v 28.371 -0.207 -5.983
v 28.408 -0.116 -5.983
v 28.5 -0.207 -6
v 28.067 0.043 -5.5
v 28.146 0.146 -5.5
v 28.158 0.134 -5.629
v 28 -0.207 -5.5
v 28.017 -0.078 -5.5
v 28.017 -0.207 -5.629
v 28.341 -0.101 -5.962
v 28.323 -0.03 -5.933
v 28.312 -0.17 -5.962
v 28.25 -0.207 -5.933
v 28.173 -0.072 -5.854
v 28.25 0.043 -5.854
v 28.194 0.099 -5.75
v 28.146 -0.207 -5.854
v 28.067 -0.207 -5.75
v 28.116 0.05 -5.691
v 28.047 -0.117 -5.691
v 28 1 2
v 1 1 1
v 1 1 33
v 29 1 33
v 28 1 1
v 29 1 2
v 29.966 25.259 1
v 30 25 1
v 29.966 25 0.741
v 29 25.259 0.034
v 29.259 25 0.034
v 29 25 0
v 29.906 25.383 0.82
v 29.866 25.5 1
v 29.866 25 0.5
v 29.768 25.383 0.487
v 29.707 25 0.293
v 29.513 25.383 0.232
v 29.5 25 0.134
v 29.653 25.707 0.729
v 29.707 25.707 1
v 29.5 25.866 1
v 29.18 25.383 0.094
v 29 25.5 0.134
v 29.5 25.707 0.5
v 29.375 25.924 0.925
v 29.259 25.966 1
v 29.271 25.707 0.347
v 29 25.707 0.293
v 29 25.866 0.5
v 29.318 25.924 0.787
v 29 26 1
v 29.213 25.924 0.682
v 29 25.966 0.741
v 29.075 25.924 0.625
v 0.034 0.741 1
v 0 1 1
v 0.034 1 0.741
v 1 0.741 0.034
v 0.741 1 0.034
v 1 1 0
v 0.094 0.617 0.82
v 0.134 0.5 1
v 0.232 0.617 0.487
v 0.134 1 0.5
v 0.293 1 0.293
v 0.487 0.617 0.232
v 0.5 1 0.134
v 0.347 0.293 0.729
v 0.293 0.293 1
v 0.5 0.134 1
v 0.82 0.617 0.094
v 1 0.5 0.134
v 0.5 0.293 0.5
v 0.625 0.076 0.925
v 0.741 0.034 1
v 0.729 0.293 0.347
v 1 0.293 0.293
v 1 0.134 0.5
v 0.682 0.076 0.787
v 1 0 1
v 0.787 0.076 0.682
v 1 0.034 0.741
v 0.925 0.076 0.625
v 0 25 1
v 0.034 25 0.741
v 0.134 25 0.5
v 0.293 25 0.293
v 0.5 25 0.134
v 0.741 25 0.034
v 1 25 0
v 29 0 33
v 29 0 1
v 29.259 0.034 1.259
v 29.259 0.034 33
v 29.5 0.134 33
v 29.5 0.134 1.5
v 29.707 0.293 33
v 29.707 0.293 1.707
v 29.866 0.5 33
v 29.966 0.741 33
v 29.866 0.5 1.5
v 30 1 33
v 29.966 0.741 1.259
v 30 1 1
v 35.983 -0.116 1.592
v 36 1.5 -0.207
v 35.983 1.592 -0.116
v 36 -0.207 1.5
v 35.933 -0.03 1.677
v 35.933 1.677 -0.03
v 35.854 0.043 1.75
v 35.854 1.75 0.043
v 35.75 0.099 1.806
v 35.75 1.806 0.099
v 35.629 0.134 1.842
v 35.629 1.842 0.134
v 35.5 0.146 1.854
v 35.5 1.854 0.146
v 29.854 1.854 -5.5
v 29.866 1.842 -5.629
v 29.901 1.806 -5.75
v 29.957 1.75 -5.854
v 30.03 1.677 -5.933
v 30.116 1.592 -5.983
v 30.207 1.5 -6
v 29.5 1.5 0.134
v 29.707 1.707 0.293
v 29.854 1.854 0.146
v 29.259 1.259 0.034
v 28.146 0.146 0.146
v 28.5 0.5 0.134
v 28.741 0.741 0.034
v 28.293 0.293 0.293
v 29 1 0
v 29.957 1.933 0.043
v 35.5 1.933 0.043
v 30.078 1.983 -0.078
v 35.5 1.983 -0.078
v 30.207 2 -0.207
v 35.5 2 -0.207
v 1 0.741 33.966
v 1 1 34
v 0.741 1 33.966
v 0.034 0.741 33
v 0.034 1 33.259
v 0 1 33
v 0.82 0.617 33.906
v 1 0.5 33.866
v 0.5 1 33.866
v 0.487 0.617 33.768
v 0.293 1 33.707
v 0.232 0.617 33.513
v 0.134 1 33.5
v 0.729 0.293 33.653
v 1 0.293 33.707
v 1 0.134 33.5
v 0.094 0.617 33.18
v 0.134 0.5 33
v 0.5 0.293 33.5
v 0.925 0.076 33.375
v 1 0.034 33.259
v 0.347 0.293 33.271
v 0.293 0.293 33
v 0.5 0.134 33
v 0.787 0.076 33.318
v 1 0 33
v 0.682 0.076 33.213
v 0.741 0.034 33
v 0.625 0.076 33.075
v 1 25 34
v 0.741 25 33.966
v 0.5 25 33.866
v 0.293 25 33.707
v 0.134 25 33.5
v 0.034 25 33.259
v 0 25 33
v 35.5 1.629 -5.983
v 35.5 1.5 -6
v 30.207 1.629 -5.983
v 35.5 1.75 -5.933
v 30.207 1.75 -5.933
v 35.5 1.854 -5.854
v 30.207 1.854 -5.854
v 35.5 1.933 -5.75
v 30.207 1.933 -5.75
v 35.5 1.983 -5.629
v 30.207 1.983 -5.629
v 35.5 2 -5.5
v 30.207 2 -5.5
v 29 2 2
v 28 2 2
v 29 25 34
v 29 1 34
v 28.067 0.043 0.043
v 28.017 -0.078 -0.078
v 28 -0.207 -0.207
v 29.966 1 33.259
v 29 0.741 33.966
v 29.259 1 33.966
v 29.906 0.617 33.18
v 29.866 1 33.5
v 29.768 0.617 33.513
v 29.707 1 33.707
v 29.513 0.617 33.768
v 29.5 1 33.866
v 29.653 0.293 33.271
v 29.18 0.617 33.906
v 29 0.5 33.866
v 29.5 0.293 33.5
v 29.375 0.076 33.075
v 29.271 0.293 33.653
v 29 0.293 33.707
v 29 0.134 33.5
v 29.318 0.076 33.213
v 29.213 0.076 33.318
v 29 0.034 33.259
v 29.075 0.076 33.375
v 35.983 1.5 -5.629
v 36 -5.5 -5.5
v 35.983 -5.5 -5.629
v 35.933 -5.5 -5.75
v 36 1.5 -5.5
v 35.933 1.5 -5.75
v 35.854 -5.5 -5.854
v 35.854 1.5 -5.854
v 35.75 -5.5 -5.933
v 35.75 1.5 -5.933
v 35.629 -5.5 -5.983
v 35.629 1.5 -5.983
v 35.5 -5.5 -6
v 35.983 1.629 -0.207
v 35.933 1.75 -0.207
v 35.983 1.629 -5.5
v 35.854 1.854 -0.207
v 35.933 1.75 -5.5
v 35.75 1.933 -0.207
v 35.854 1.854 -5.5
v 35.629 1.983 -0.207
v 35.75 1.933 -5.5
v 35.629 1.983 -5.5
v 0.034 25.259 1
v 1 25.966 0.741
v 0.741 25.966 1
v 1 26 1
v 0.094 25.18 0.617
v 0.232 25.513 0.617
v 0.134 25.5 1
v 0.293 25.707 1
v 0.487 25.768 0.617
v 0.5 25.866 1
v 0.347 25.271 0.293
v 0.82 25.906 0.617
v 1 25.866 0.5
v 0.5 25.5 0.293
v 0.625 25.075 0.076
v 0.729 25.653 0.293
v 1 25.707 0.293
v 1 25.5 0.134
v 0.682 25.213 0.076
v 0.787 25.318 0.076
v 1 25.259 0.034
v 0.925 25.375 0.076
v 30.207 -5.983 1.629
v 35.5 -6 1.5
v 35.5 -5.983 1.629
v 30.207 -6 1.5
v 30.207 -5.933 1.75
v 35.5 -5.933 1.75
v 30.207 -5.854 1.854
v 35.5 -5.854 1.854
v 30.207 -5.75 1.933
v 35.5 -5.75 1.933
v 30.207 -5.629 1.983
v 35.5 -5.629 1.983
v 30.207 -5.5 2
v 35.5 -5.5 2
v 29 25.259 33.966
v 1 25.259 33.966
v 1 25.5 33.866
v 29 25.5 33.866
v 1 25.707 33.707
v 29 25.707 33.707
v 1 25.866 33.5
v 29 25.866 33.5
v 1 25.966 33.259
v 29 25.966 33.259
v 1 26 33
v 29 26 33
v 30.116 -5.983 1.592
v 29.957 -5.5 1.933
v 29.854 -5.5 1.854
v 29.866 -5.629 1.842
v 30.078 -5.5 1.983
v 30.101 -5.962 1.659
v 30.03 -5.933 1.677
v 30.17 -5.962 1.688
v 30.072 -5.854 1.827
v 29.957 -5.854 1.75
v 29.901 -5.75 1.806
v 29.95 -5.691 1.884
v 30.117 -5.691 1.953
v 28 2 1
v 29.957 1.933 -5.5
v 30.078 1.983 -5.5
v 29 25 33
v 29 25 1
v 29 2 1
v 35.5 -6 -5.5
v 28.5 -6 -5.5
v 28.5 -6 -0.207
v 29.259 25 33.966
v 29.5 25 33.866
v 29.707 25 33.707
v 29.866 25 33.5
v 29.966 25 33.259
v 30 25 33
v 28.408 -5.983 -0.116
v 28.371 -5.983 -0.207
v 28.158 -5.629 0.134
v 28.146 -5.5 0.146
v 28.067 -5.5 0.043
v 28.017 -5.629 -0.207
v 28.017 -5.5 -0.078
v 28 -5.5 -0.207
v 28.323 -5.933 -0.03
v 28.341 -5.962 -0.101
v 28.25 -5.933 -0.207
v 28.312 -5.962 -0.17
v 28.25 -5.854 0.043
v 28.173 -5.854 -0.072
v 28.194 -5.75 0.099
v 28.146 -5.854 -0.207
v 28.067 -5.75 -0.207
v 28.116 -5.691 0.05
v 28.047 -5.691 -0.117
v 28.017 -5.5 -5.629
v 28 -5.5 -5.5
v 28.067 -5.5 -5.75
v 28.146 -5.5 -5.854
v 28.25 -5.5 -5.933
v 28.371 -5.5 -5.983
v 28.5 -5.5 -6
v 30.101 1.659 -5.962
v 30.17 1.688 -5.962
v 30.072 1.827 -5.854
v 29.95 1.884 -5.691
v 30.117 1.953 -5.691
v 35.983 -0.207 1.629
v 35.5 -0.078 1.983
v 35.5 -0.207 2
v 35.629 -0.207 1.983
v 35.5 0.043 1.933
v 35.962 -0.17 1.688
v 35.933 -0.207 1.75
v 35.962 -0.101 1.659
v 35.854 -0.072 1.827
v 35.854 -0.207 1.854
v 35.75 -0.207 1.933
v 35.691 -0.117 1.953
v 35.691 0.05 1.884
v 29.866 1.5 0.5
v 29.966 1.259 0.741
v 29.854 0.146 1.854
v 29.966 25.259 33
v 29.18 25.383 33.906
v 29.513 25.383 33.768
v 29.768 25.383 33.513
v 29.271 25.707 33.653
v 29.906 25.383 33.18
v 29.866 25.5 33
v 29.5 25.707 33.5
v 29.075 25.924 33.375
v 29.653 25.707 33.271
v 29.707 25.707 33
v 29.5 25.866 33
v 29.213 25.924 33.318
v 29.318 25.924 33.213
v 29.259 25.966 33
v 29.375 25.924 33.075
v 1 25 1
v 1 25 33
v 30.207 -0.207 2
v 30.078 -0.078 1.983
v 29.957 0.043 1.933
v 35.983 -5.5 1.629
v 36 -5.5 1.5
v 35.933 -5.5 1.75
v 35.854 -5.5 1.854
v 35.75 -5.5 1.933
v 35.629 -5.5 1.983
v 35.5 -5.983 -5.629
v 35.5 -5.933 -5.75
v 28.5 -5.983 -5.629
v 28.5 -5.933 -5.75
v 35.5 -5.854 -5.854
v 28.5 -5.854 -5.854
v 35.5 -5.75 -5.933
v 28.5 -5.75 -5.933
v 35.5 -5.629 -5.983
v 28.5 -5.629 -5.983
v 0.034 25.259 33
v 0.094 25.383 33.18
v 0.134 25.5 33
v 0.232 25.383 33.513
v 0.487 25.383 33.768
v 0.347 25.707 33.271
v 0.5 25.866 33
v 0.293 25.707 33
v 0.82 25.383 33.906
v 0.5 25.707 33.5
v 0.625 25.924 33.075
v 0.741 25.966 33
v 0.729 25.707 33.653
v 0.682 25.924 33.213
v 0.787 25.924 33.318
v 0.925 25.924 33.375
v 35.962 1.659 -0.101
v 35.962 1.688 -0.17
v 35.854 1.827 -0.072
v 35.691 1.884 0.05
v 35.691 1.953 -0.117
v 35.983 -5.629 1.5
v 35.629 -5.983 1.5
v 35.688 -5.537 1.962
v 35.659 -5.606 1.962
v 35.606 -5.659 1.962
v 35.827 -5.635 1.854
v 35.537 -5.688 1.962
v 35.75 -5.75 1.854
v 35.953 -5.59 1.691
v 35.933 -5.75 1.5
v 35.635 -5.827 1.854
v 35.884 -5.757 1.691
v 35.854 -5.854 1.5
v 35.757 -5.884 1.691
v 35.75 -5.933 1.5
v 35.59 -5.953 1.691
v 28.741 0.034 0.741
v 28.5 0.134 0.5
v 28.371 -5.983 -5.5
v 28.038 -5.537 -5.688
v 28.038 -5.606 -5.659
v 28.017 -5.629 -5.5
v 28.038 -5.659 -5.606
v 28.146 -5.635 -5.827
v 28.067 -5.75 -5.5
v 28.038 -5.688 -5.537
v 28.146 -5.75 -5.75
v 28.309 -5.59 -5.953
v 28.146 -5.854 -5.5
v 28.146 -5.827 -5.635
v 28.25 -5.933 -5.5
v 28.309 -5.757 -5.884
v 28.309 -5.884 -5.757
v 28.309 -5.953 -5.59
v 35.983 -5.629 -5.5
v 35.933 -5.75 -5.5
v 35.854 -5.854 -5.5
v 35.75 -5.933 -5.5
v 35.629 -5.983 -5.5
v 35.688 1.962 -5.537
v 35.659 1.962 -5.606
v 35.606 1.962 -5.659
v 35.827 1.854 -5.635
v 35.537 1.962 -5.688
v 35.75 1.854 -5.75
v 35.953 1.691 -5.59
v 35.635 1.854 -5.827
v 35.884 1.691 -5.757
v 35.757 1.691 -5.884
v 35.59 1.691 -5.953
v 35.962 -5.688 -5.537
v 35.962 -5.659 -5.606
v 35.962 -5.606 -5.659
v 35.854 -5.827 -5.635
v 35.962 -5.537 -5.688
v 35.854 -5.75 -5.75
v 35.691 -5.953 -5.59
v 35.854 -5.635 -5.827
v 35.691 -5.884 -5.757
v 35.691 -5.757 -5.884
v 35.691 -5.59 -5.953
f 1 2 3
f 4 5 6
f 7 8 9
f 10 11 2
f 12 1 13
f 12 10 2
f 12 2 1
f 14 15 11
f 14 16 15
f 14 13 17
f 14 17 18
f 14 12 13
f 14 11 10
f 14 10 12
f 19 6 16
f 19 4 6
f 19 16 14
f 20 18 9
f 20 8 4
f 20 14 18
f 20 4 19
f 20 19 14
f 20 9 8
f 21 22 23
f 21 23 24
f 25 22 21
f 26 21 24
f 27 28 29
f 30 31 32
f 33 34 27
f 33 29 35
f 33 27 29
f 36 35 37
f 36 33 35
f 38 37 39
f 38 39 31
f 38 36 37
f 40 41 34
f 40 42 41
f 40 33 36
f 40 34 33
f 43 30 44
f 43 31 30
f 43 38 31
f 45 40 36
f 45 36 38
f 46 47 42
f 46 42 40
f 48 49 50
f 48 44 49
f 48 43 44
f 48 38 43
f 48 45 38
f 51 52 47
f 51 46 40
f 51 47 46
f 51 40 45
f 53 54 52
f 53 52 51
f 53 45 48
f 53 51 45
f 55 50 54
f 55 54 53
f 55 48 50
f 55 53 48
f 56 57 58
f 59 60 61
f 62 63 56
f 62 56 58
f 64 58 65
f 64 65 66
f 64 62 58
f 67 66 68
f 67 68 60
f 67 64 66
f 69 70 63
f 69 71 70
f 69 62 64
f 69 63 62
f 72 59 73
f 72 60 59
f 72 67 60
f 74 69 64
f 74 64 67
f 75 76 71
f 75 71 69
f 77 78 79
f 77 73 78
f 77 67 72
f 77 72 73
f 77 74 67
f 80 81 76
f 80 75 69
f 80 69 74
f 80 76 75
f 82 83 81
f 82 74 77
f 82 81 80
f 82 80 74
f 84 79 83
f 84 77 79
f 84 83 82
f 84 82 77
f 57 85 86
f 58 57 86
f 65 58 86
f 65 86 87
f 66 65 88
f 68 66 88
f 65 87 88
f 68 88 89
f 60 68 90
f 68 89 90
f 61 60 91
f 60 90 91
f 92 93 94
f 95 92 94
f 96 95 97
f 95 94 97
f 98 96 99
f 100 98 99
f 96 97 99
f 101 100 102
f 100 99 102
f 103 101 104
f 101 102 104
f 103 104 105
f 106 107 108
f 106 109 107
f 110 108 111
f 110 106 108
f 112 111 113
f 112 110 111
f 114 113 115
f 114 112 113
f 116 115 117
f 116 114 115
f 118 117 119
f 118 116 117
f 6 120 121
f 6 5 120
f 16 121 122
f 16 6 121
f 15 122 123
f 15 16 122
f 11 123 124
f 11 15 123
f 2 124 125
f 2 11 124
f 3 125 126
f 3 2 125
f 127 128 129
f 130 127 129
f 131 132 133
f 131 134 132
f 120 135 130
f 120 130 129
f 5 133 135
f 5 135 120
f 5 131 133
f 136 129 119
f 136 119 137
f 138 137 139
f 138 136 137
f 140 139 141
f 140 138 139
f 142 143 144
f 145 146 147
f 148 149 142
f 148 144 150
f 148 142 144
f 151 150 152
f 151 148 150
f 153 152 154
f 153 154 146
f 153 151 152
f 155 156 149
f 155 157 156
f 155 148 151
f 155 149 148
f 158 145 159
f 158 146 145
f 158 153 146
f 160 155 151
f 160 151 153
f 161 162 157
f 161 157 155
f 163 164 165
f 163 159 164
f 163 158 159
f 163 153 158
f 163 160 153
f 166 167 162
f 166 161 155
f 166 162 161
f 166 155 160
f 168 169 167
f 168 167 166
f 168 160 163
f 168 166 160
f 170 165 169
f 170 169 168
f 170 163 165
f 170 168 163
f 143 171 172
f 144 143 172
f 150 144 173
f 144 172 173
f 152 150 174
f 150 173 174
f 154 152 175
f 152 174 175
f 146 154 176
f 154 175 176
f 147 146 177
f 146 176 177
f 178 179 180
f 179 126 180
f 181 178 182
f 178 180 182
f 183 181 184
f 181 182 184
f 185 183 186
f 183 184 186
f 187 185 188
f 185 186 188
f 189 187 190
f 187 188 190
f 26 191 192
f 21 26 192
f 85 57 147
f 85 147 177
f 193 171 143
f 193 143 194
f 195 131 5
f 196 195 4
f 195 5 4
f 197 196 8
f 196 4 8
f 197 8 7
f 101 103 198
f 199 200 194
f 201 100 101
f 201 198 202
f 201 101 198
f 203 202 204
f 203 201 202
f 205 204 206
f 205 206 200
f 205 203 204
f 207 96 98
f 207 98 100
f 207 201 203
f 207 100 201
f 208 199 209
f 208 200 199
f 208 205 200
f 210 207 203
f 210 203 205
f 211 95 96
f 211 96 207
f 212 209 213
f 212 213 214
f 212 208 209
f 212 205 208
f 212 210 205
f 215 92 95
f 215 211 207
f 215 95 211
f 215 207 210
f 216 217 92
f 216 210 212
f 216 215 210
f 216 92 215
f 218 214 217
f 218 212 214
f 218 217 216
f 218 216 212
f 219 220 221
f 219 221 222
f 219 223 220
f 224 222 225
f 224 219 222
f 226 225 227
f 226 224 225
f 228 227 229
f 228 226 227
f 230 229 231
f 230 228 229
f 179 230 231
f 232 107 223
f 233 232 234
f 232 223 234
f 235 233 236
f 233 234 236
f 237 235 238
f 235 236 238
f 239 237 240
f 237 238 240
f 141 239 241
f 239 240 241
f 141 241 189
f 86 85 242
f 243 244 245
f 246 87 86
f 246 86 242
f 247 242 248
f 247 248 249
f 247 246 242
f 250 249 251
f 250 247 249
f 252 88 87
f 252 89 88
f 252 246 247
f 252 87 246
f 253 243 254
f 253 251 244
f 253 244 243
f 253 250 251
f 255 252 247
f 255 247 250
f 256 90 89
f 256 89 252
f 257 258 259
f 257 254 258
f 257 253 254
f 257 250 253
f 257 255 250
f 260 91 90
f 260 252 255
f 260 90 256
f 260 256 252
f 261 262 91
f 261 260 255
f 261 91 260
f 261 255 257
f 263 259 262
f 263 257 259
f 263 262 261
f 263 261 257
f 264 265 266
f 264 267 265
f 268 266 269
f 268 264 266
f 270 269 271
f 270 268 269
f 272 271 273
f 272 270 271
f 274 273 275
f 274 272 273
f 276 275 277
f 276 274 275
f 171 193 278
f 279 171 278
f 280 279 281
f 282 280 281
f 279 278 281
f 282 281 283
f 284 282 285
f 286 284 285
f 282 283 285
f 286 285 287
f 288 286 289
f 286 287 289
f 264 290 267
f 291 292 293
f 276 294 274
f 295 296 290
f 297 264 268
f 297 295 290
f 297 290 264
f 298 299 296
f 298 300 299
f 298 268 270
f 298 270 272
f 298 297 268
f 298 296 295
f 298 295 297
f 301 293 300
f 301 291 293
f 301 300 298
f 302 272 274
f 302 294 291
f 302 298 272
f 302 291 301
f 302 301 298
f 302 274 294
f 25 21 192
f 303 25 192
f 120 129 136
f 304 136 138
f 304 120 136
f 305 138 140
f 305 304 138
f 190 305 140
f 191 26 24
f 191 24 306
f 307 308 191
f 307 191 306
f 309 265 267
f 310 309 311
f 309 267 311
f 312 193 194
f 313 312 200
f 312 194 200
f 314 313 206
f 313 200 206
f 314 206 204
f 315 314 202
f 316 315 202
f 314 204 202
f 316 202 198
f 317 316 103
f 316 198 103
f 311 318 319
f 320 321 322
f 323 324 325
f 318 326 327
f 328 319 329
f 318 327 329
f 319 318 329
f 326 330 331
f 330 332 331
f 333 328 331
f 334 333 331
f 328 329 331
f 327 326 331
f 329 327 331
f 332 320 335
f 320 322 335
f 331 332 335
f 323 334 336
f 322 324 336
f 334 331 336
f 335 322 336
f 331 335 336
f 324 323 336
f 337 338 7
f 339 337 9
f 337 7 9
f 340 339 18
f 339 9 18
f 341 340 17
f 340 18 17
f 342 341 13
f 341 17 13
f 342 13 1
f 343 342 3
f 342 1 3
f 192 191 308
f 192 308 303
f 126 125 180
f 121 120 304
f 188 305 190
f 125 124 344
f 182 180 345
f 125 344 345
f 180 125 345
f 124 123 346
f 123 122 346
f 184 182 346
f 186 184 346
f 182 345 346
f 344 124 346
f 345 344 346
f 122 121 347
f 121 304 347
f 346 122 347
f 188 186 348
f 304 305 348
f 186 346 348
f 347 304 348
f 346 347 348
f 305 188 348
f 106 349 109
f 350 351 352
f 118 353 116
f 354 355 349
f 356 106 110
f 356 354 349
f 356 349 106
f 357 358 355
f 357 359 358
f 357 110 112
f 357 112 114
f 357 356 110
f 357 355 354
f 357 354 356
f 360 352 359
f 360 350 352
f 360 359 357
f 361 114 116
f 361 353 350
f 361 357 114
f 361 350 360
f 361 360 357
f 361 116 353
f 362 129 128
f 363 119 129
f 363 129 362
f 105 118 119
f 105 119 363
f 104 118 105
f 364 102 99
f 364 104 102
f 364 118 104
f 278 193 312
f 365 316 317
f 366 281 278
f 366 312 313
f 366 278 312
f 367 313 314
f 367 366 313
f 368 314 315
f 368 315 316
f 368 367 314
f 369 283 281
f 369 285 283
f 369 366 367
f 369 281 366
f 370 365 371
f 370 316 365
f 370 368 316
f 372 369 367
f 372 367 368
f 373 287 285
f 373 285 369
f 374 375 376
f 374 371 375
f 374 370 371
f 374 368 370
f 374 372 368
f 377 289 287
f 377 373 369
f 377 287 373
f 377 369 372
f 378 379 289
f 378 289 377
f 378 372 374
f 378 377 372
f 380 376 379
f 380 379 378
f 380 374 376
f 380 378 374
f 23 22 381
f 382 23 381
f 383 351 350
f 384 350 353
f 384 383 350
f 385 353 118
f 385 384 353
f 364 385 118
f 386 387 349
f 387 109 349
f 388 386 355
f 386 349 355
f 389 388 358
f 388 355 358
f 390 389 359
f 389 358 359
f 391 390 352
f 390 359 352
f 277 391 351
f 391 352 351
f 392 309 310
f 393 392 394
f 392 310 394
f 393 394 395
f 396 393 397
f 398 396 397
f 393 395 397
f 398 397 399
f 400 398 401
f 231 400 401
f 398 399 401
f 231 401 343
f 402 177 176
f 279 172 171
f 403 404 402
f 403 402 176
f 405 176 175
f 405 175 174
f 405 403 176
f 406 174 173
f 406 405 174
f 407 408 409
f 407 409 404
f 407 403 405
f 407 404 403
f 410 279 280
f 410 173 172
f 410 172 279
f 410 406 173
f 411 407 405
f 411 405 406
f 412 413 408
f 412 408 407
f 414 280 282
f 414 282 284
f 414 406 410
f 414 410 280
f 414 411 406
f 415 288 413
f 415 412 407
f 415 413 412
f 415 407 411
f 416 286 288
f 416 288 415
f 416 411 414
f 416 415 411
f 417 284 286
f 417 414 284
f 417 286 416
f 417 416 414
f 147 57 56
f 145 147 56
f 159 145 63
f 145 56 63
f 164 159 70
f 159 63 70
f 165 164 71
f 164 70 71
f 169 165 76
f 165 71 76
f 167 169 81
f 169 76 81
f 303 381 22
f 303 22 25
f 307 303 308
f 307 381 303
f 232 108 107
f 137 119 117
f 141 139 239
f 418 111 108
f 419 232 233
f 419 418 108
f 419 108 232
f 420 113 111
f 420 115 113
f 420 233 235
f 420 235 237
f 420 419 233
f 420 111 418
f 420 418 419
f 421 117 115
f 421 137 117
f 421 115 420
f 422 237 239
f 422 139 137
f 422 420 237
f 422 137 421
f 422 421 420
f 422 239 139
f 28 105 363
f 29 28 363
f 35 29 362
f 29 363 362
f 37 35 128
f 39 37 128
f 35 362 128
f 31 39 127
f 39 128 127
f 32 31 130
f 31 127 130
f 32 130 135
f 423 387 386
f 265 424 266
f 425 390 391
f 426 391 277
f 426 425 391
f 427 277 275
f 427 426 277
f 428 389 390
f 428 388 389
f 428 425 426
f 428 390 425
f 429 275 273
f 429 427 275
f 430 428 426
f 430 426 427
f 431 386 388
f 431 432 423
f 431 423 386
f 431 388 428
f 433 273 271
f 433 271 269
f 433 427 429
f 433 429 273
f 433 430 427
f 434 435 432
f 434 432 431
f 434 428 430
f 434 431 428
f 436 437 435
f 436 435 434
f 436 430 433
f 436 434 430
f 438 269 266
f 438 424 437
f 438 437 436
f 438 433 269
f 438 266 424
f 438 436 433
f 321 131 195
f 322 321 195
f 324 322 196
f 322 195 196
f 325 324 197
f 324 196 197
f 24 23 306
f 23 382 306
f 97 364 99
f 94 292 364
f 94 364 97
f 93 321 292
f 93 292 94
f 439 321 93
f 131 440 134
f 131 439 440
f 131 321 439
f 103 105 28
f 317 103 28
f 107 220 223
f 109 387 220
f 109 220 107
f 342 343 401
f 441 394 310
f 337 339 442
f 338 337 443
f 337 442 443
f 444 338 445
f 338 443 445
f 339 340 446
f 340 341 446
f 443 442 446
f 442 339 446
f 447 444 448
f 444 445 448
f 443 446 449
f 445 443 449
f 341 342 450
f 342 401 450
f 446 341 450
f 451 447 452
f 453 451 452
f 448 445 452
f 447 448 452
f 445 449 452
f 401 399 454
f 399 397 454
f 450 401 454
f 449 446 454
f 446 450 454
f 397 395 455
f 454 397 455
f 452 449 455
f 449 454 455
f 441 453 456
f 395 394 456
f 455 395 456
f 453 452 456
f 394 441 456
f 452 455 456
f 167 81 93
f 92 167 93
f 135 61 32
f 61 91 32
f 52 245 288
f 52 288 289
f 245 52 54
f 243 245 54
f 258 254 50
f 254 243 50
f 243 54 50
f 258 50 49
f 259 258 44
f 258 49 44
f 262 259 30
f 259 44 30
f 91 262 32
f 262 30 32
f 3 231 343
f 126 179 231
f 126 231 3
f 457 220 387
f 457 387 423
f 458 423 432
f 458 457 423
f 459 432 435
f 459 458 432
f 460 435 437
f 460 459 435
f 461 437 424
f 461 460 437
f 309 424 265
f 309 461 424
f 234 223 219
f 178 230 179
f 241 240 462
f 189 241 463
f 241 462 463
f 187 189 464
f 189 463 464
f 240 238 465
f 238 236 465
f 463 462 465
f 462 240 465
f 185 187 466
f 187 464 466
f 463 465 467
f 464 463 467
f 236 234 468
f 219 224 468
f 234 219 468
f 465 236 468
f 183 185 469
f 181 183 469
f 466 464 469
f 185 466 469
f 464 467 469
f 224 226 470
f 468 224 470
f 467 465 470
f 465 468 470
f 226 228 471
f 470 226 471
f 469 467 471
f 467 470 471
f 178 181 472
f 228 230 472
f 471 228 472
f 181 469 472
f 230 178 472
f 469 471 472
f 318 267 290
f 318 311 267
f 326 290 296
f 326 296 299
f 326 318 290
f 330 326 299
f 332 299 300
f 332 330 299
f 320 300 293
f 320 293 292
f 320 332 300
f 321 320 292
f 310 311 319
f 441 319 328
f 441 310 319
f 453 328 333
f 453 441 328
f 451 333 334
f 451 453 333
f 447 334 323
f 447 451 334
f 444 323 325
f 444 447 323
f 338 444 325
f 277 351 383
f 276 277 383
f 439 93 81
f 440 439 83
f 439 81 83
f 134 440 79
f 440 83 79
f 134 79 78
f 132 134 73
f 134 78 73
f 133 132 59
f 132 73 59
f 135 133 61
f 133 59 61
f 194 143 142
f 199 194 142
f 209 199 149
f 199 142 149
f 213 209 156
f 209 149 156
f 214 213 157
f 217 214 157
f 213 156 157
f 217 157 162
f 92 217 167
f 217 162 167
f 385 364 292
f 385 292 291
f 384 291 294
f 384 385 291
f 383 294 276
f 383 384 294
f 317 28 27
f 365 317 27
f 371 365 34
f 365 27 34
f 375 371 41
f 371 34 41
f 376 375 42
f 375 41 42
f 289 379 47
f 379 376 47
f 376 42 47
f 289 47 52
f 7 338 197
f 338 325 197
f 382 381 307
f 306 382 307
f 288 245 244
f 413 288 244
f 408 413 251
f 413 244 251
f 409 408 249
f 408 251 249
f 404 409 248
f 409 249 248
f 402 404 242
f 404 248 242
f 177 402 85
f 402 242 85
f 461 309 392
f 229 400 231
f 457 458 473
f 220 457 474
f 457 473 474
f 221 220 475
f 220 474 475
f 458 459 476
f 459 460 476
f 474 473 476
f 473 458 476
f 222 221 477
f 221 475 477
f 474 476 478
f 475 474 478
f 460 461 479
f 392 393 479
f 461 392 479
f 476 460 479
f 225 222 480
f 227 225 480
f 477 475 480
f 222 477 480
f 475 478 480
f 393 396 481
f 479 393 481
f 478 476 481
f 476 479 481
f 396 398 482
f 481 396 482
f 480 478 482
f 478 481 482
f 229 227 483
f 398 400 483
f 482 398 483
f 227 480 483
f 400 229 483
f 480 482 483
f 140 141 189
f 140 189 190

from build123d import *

# Parameters (mm, degrees)
SKETCH1_W                = 30
SKETCH1_H                = 26
BOSS_EXTRUDE1_DEPTH      = 34
SHELL1_T                 = 1
BOSS_EXTRUDE3_DEPTH      = 6
BOSS_EXTRUDE3_DEPTH_BACK = 2
SKETCH2_W                = 8
SKETCH2_H                = 8
CHAMFER2_SIZE            = 2
FILLET1_R                = 1
FILLET2_R                = 0.5


with BuildPart() as part:
    # Sketch1 → Boss-Extrude1 (new body)
    with BuildSketch(Plane.XY):
        with Locations((15, 13)):
            Rectangle(SKETCH1_W, SKETCH1_H)
    extrude(amount=BOSS_EXTRUDE1_DEPTH)

    # Shell1 (no face opened: a closed hollow body)
    add(offset(amount=-SHELL1_T, mode=Mode.PRIVATE), mode=Mode.SUBTRACT)

    # Sketch2 → Boss-Extrude3 (add, two sides: drawn at the far end of the back side and taken through both)
    with BuildSketch(Plane(origin=(0, 0, 0), x_dir=(-1, 0, 0), z_dir=(0, 0, -1)).offset(-BOSS_EXTRUDE3_DEPTH_BACK)):
        with Locations((-32, -2)):
            Rectangle(SKETCH2_W, SKETCH2_H)
    extrude(amount=BOSS_EXTRUDE3_DEPTH + BOSS_EXTRUDE3_DEPTH_BACK)

    # Chamfer2
    chamfer2_edges = [part.edges().sort_by_distance(p)[0] for p in [
        (28, -3, 2),
        (28, 2, -3),
        (33, 2, 2),
    ]]
    chamfer(chamfer2_edges, length=CHAMFER2_SIZE)

    # Fillet1
    # the kernel refuses this fillet: 1 mm, written as the material it takes off along each edge
    with BuildSketch(Plane(origin=(1, 25, 1), x_dir=(0, 1, 0), z_dir=(0, 0, -1))) as fillet1_piece_1_section:
        Polygon((0, 0), (FILLET1_R, 0), (FILLET1_R, -FILLET1_R), (0, -FILLET1_R), align=None)
    fillet1_piece_1 = extrude(amount=FILLET1_R, mode=Mode.PRIVATE)
    fillet1_piece_1 = fillet1_piece_1 - Plane(origin=(1, 25, 1), x_dir=(0.7071067811865475, -0.7071067811865475, 0), z_dir=(0, 0, -1)) * Sphere(FILLET1_R, mode=Mode.PRIVATE)
    add(fillet1_piece_1, mode=Mode.SUBTRACT)
    with BuildSketch(Plane(origin=(1, 1, 1), x_dir=(0, 0, -1), z_dir=(0, -1, 0))) as fillet1_piece_2_section:
        Polygon((0, 0), (FILLET1_R, 0), (FILLET1_R, -FILLET1_R), (0, -FILLET1_R), align=None)
    fillet1_piece_2 = extrude(amount=FILLET1_R, mode=Mode.PRIVATE)
    fillet1_piece_2 = fillet1_piece_2 - Plane(origin=(1, 1, 1), x_dir=(0.7071067811865475, 0, 0.7071067811865475), z_dir=(0, -1, 0)) * Sphere(FILLET1_R, mode=Mode.PRIVATE)
    add(fillet1_piece_2, mode=Mode.SUBTRACT)
    with BuildSketch(Plane(origin=(29, 25, 1), x_dir=(0, 0, -1), z_dir=(0, 1, 0))) as fillet1_piece_3_section:
        Polygon((0, 0), (FILLET1_R, 0), (FILLET1_R, -FILLET1_R), (0, -FILLET1_R), align=None)
    fillet1_piece_3 = extrude(amount=FILLET1_R, mode=Mode.PRIVATE)
    fillet1_piece_3 = fillet1_piece_3 - Plane(origin=(29, 25, 1), x_dir=(-0.7071067811865475, 0, 0.7071067811865475), z_dir=(0, 1, 0)) * Sphere(FILLET1_R, mode=Mode.PRIVATE)
    add(fillet1_piece_3, mode=Mode.SUBTRACT)
    with BuildSketch(Plane(origin=(1, 1, 33), x_dir=(-1, 0, 0), z_dir=(0, -1, 0))) as fillet1_piece_4_section:
        Polygon((0, 0), (FILLET1_R, 0), (FILLET1_R, -FILLET1_R), (0, -FILLET1_R), align=None)
    fillet1_piece_4 = extrude(amount=FILLET1_R, mode=Mode.PRIVATE)
    fillet1_piece_4 = fillet1_piece_4 - Plane(origin=(1, 1, 33), x_dir=(0.7071067811865475, 0, -0.7071067811865475), z_dir=(0, -1, 0)) * Sphere(FILLET1_R, mode=Mode.PRIVATE)
    add(fillet1_piece_4, mode=Mode.SUBTRACT)
    with BuildSketch(Plane(origin=(29, 1, 33), x_dir=(1, 0, 0), z_dir=(0, -1, 0))) as fillet1_piece_5_section:
        Polygon((0, 0), (FILLET1_R, 0), (FILLET1_R, FILLET1_R), (0, FILLET1_R), align=None)
    fillet1_piece_5 = extrude(amount=FILLET1_R, mode=Mode.PRIVATE)
    fillet1_piece_5 = fillet1_piece_5 - Plane(origin=(29, 1, 33), x_dir=(-0.7071067811865475, 0, -0.7071067811865475), z_dir=(0, -1, 0)) * Sphere(FILLET1_R, mode=Mode.PRIVATE)
    add(fillet1_piece_5, mode=Mode.SUBTRACT)
    with BuildSketch(Plane(origin=(29, 25, 33), x_dir=(1, 0, 0), z_dir=(0, 1, 0))) as fillet1_piece_6_section:
        Polygon((0, 0), (FILLET1_R, 0), (FILLET1_R, -FILLET1_R), (0, -FILLET1_R), align=None)
    fillet1_piece_6 = extrude(amount=FILLET1_R, mode=Mode.PRIVATE)
    fillet1_piece_6 = fillet1_piece_6 - Plane(origin=(29, 25, 33), x_dir=(-0.7071067811865475, 0, -0.7071067811865475), z_dir=(0, 1, 0)) * Sphere(FILLET1_R, mode=Mode.PRIVATE)
    add(fillet1_piece_6, mode=Mode.SUBTRACT)
    with BuildSketch(Plane(origin=(1, 25, 33), x_dir=(-1, 0, 0), z_dir=(0, 1, 0))) as fillet1_piece_7_section:
        Polygon((0, 0), (FILLET1_R, 0), (FILLET1_R, FILLET1_R), (0, FILLET1_R), align=None)
    fillet1_piece_7 = extrude(amount=FILLET1_R, mode=Mode.PRIVATE)
    fillet1_piece_7 = fillet1_piece_7 - Plane(origin=(1, 25, 33), x_dir=(0.7071067811865475, 0, -0.7071067811865475), z_dir=(0, 1, 0)) * Sphere(FILLET1_R, mode=Mode.PRIVATE)
    add(fillet1_piece_7, mode=Mode.SUBTRACT)
    with BuildSketch(Plane(origin=(0, 25, 0), x_dir=(1, 0, 0), z_dir=(0, -1, 0)), Plane(origin=(30, 1, 34), x_dir=(0, 0, -1), z_dir=(0, 1, 0)), Plane(origin=(0, 25, 34), x_dir=(0, 0, -1), z_dir=(0, -1, 0))) as fillet1_piece_8:
        with BuildLine():
            CenterArc((FILLET1_R, FILLET1_R), FILLET1_R, 180, 90)
            Line((0, FILLET1_R), (0, 0))
            Line((0, 0), (FILLET1_R, 0))
        make_face()
    extrude(amount=24, mode=Mode.SUBTRACT)
    with BuildSketch(Plane(origin=(1, 0, 0), x_dir=(0, 0, 1), z_dir=(1, 0, 0))) as fillet1_piece_9_section:
        with BuildLine():
            CenterArc((FILLET1_R, -FILLET1_R), FILLET1_R, 90, 90)
            Line((0, -FILLET1_R), (0, 0))
            Line((0, 0), (FILLET1_R, 0))
        make_face()
    fillet1_piece_9 = extrude(amount=29.5, mode=Mode.PRIVATE)
    fillet1_piece_9 = split(fillet1_piece_9, bisect_by=Plane(origin=(21.381816869, 0.226411675, -6.618183131), z_dir=(-0.7071067811865476, 0, 0.7071067811865476)), keep=Keep.TOP, mode=Mode.PRIVATE)
    fillet1_piece_9 = split(fillet1_piece_9, bisect_by=Plane(origin=(21.381816869, -6.618183131, 0.226411675), z_dir=(-0.7071067811865476, 0.7071067811865476, 0)), keep=Keep.TOP, mode=Mode.PRIVATE)
    add(fillet1_piece_9, mode=Mode.SUBTRACT)
    with BuildSketch(Plane(origin=(1, 0, 0), x_dir=(0, 0, 1), z_dir=(1, 0, 0))) as fillet1_piece_10_section:
        with BuildLine():
            CenterArc((FILLET1_R, -FILLET1_R), FILLET1_R, 90, 90)
            Line((0, -FILLET1_R), (0, 0))
            Line((0, 0), (FILLET1_R, 0))
        make_face()
    fillet1_piece_10 = extrude(amount=29.5, mode=Mode.PRIVATE)
    fillet1_piece_10 = split(fillet1_piece_10, bisect_by=Plane(origin=(28.16446835, 0.528927527, 0.16446835), z_dir=(0.7071067811865476, 0, -0.7071067811865476)), keep=Keep.TOP, mode=Mode.PRIVATE)
    fillet1_piece_10 = split(fillet1_piece_10, bisect_by=Plane(origin=(28.407441135, 0.407441135, 0.042981958), z_dir=(-0.7071067811865476, 0.7071067811865476, 0)), keep=Keep.TOP, mode=Mode.PRIVATE)
    add(fillet1_piece_10, mode=Mode.SUBTRACT)
    with BuildSketch(Plane(origin=(1, 0, 0), x_dir=(0, 0, 1), z_dir=(1, 0, 0))) as fillet1_piece_11_section:
        with BuildLine():
            CenterArc((FILLET1_R, -FILLET1_R), FILLET1_R, 90, 90)
            Line((0, -FILLET1_R), (0, 0))
            Line((0, 0), (FILLET1_R, 0))
        make_face()
    fillet1_piece_11 = extrude(amount=29.5, mode=Mode.PRIVATE)
    fillet1_piece_11 = split(fillet1_piece_11, bisect_by=Plane(origin=(28.407441135, 0.042981958, 0.407441135), z_dir=(-0.7071067811865476, 0, 0.7071067811865476)), keep=Keep.TOP, mode=Mode.PRIVATE)
    fillet1_piece_11 = split(fillet1_piece_11, bisect_by=Plane(origin=(28.16446835, 0.16446835, 0.528927527), z_dir=(0.7071067811865476, -0.7071067811865476, 0)), keep=Keep.TOP, mode=Mode.PRIVATE)
    add(fillet1_piece_11, mode=Mode.SUBTRACT)
    with BuildSketch(Plane(origin=(30, -0.5, 0), x_dir=(-1, 0, 0), z_dir=(0, 1, 0))) as fillet1_piece_12_section:
        with BuildLine():
            CenterArc((FILLET1_R, FILLET1_R), FILLET1_R, 180, 90)
            Line((0, FILLET1_R), (0, 0))
            Line((0, 0), (FILLET1_R, 0))
        make_face()
    fillet1_piece_12 = extrude(amount=25.5, mode=Mode.PRIVATE)
    fillet1_piece_12 = split(fillet1_piece_12, bisect_by=Plane(origin=(29.83553165, 1.83553165, 0.528927527), z_dir=(0.7071067811865476, -0.7071067811865476, 0)), keep=Keep.TOP, mode=Mode.PRIVATE)
    fillet1_piece_12 = split(fillet1_piece_12, bisect_by=Plane(origin=(29.957018042, 1.592558865, 0.407441135), z_dir=(0, 0.7071067811865476, 0.7071067811865476)), keep=Keep.TOP, mode=Mode.PRIVATE)
    add(fillet1_piece_12, mode=Mode.SUBTRACT)
    with BuildSketch(Plane(origin=(30, -0.5, 0), x_dir=(-1, 0, 0), z_dir=(0, 1, 0))) as fillet1_piece_13_section:
        with BuildLine():
            CenterArc((FILLET1_R, FILLET1_R), FILLET1_R, 180, 90)
            Line((0, FILLET1_R), (0, 0))
            Line((0, 0), (FILLET1_R, 0))
        make_face()
    fillet1_piece_13 = extrude(amount=25.5, mode=Mode.PRIVATE)
    fillet1_piece_13 = split(fillet1_piece_13, bisect_by=Plane(origin=(29.592558865, 1.592558865, 0.042981958), z_dir=(-0.7071067811865476, 0.7071067811865476, 0)), keep=Keep.TOP, mode=Mode.PRIVATE)
    fillet1_piece_13 = split(fillet1_piece_13, bisect_by=Plane(origin=(29.471072473, 1.83553165, 0.16446835), z_dir=(0, -0.7071067811865476, -0.7071067811865476)), keep=Keep.TOP, mode=Mode.PRIVATE)
    add(fillet1_piece_13, mode=Mode.SUBTRACT)
    with BuildSketch(Plane(origin=(30, -0.5, 0), x_dir=(-1, 0, 0), z_dir=(0, 1, 0))) as fillet1_piece_14_section:
        with BuildLine():
            CenterArc((FILLET1_R, FILLET1_R), FILLET1_R, 180, 90)
            Line((0, FILLET1_R), (0, 0))
            Line((0, 0), (FILLET1_R, 0))
        make_face()
    fillet1_piece_14 = extrude(amount=25.5, mode=Mode.PRIVATE)
    fillet1_piece_14 = split(fillet1_piece_14, bisect_by=Plane(origin=(35.618173362, 7.618173362, 0.226414546), z_dir=(-0.7071067811865476, 0.7071067811865476, 0)), keep=Keep.TOP, mode=Mode.PRIVATE)
    fillet1_piece_14 = split(fillet1_piece_14, bisect_by=Plane(origin=(29.773585454, 7.618173362, -5.618173362), z_dir=(0, 0.7071067811865476, 0.7071067811865476)), keep=Keep.TOP, mode=Mode.PRIVATE)
    add(fillet1_piece_14, mode=Mode.SUBTRACT)
    with BuildSketch(Plane(origin=(29, 26, 0), x_dir=(0, -1, 0), z_dir=(-1, 0, 0)), Plane(origin=(1, 0, 34), x_dir=(0, 0, -1), z_dir=(1, 0, 0))) as fillet1_piece_15:
        with BuildLine():
            CenterArc((FILLET1_R, FILLET1_R), FILLET1_R, 180, 90)
            Line((0, FILLET1_R), (0, 0))
            Line((0, 0), (FILLET1_R, 0))
        make_face()
    extrude(amount=28, mode=Mode.SUBTRACT)
    with BuildSketch(Plane(origin=(29, 26, 34), x_dir=(0, -1, 0), z_dir=(-1, 0, 0))) as fillet1_piece_16:
        with BuildLine():
            CenterArc((FILLET1_R, -FILLET1_R), FILLET1_R, 90, 90)
            Line((0, -FILLET1_R), (0, 0))
            Line((0, 0), (FILLET1_R, 0))
        make_face()
    extrude(amount=28, mode=Mode.SUBTRACT)
    with BuildSketch(Plane(origin=(0, 26, 1), x_dir=(0, -1, 0), z_dir=(0, 0, 1)), Plane(origin=(0, 0, 1), x_dir=(1, 0, 0), z_dir=(0, 0, 1))) as fillet1_piece_17:
        with BuildLine():
            CenterArc((FILLET1_R, FILLET1_R), FILLET1_R, 180, 90)
            Line((0, FILLET1_R), (0, 0))
            Line((0, 0), (FILLET1_R, 0))
        make_face()
    extrude(amount=32, mode=Mode.SUBTRACT)
    with BuildSketch(Plane(origin=(30, 26, 1), x_dir=(0, -1, 0), z_dir=(0, 0, 1))) as fillet1_piece_18:
        with BuildLine():
            CenterArc((FILLET1_R, -FILLET1_R), FILLET1_R, 90, 90)
            Line((0, -FILLET1_R), (0, 0))
            Line((0, 0), (FILLET1_R, 0))
        make_face()
    extrude(amount=32, mode=Mode.SUBTRACT)
    with BuildSketch(Plane(origin=(30, 0, -0.5), x_dir=(-1, 0, 0), z_dir=(0, 0, 1))) as fillet1_piece_19_section:
        with BuildLine():
            CenterArc((FILLET1_R, -FILLET1_R), FILLET1_R, 90, 90)
            Line((0, -FILLET1_R), (0, 0))
            Line((0, 0), (FILLET1_R, 0))
        make_face()
    fillet1_piece_19 = extrude(amount=33.5, mode=Mode.PRIVATE)
    fillet1_piece_19 = split(fillet1_piece_19, bisect_by=Plane(origin=(29.83553165, 0.528927527, 1.83553165), z_dir=(0.7071067811865476, 0, -0.7071067811865476)), keep=Keep.TOP, mode=Mode.PRIVATE)
    fillet1_piece_19 = split(fillet1_piece_19, bisect_by=Plane(origin=(29.957018042, 0.407441135, 1.592558865), z_dir=(0, 0.7071067811865476, 0.7071067811865476)), keep=Keep.TOP, mode=Mode.PRIVATE)
    add(fillet1_piece_19, mode=Mode.SUBTRACT)
    with BuildSketch(Plane(origin=(30, 0, -0.5), x_dir=(-1, 0, 0), z_dir=(0, 0, 1))) as fillet1_piece_20_section:
        with BuildLine():
            CenterArc((FILLET1_R, -FILLET1_R), FILLET1_R, 90, 90)
            Line((0, -FILLET1_R), (0, 0))
            Line((0, 0), (FILLET1_R, 0))
        make_face()
    fillet1_piece_20 = extrude(amount=33.5, mode=Mode.PRIVATE)
    fillet1_piece_20 = split(fillet1_piece_20, bisect_by=Plane(origin=(29.592558865, 0.042981958, 1.592558865), z_dir=(-0.7071067811865476, 0, 0.7071067811865476)), keep=Keep.TOP, mode=Mode.PRIVATE)
    fillet1_piece_20 = split(fillet1_piece_20, bisect_by=Plane(origin=(29.471072473, 0.16446835, 1.83553165), z_dir=(0, -0.7071067811865476, -0.7071067811865476)), keep=Keep.TOP, mode=Mode.PRIVATE)
    add(fillet1_piece_20, mode=Mode.SUBTRACT)
    with BuildSketch(Plane(origin=(30, 0, -0.5), x_dir=(-1, 0, 0), z_dir=(0, 0, 1))) as fillet1_piece_21_section:
        with BuildLine():
            CenterArc((FILLET1_R, -FILLET1_R), FILLET1_R, 90, 90)
            Line((0, -FILLET1_R), (0, 0))
            Line((0, 0), (FILLET1_R, 0))
        make_face()
    fillet1_piece_21 = extrude(amount=33.5, mode=Mode.PRIVATE)
    fillet1_piece_21 = split(fillet1_piece_21, bisect_by=Plane(origin=(37.618190384, 0.226409543, 9.618190384), z_dir=(-0.7071067811865476, 0, 0.7071067811865476)), keep=Keep.TOP, mode=Mode.PRIVATE)
    fillet1_piece_21 = split(fillet1_piece_21, bisect_by=Plane(origin=(29.773590457, -7.618190384, 9.618190384), z_dir=(0, 0.7071067811865476, 0.7071067811865476)), keep=Keep.TOP, mode=Mode.PRIVATE)
    add(fillet1_piece_21, mode=Mode.SUBTRACT)

    # Fillet2
    fillet2_edges = [part.edges().sort_by_distance(p)[0] for p in [
        (32, -6, -6),
        (36, -6, -2),
        (36, -2, -6),
        (36, 2, -3),
        (33, 2, -6),
        (30, 2, -3),
        (33, 2, 0),
        (36, -3, 2),
        (36, 1, 1),
        (33, -6, 2),
        (30, -3, 2),
        (33, 0, 2),
        (28, -3, -6),
        (28, -6, -3),
        (28, -3, 0),
        (28, 0, -3),
        (29, 1, -6),
        (29, -6, 1),
    ]]
    fillet(fillet2_edges, radius=FILLET2_R)


solid = part.part
